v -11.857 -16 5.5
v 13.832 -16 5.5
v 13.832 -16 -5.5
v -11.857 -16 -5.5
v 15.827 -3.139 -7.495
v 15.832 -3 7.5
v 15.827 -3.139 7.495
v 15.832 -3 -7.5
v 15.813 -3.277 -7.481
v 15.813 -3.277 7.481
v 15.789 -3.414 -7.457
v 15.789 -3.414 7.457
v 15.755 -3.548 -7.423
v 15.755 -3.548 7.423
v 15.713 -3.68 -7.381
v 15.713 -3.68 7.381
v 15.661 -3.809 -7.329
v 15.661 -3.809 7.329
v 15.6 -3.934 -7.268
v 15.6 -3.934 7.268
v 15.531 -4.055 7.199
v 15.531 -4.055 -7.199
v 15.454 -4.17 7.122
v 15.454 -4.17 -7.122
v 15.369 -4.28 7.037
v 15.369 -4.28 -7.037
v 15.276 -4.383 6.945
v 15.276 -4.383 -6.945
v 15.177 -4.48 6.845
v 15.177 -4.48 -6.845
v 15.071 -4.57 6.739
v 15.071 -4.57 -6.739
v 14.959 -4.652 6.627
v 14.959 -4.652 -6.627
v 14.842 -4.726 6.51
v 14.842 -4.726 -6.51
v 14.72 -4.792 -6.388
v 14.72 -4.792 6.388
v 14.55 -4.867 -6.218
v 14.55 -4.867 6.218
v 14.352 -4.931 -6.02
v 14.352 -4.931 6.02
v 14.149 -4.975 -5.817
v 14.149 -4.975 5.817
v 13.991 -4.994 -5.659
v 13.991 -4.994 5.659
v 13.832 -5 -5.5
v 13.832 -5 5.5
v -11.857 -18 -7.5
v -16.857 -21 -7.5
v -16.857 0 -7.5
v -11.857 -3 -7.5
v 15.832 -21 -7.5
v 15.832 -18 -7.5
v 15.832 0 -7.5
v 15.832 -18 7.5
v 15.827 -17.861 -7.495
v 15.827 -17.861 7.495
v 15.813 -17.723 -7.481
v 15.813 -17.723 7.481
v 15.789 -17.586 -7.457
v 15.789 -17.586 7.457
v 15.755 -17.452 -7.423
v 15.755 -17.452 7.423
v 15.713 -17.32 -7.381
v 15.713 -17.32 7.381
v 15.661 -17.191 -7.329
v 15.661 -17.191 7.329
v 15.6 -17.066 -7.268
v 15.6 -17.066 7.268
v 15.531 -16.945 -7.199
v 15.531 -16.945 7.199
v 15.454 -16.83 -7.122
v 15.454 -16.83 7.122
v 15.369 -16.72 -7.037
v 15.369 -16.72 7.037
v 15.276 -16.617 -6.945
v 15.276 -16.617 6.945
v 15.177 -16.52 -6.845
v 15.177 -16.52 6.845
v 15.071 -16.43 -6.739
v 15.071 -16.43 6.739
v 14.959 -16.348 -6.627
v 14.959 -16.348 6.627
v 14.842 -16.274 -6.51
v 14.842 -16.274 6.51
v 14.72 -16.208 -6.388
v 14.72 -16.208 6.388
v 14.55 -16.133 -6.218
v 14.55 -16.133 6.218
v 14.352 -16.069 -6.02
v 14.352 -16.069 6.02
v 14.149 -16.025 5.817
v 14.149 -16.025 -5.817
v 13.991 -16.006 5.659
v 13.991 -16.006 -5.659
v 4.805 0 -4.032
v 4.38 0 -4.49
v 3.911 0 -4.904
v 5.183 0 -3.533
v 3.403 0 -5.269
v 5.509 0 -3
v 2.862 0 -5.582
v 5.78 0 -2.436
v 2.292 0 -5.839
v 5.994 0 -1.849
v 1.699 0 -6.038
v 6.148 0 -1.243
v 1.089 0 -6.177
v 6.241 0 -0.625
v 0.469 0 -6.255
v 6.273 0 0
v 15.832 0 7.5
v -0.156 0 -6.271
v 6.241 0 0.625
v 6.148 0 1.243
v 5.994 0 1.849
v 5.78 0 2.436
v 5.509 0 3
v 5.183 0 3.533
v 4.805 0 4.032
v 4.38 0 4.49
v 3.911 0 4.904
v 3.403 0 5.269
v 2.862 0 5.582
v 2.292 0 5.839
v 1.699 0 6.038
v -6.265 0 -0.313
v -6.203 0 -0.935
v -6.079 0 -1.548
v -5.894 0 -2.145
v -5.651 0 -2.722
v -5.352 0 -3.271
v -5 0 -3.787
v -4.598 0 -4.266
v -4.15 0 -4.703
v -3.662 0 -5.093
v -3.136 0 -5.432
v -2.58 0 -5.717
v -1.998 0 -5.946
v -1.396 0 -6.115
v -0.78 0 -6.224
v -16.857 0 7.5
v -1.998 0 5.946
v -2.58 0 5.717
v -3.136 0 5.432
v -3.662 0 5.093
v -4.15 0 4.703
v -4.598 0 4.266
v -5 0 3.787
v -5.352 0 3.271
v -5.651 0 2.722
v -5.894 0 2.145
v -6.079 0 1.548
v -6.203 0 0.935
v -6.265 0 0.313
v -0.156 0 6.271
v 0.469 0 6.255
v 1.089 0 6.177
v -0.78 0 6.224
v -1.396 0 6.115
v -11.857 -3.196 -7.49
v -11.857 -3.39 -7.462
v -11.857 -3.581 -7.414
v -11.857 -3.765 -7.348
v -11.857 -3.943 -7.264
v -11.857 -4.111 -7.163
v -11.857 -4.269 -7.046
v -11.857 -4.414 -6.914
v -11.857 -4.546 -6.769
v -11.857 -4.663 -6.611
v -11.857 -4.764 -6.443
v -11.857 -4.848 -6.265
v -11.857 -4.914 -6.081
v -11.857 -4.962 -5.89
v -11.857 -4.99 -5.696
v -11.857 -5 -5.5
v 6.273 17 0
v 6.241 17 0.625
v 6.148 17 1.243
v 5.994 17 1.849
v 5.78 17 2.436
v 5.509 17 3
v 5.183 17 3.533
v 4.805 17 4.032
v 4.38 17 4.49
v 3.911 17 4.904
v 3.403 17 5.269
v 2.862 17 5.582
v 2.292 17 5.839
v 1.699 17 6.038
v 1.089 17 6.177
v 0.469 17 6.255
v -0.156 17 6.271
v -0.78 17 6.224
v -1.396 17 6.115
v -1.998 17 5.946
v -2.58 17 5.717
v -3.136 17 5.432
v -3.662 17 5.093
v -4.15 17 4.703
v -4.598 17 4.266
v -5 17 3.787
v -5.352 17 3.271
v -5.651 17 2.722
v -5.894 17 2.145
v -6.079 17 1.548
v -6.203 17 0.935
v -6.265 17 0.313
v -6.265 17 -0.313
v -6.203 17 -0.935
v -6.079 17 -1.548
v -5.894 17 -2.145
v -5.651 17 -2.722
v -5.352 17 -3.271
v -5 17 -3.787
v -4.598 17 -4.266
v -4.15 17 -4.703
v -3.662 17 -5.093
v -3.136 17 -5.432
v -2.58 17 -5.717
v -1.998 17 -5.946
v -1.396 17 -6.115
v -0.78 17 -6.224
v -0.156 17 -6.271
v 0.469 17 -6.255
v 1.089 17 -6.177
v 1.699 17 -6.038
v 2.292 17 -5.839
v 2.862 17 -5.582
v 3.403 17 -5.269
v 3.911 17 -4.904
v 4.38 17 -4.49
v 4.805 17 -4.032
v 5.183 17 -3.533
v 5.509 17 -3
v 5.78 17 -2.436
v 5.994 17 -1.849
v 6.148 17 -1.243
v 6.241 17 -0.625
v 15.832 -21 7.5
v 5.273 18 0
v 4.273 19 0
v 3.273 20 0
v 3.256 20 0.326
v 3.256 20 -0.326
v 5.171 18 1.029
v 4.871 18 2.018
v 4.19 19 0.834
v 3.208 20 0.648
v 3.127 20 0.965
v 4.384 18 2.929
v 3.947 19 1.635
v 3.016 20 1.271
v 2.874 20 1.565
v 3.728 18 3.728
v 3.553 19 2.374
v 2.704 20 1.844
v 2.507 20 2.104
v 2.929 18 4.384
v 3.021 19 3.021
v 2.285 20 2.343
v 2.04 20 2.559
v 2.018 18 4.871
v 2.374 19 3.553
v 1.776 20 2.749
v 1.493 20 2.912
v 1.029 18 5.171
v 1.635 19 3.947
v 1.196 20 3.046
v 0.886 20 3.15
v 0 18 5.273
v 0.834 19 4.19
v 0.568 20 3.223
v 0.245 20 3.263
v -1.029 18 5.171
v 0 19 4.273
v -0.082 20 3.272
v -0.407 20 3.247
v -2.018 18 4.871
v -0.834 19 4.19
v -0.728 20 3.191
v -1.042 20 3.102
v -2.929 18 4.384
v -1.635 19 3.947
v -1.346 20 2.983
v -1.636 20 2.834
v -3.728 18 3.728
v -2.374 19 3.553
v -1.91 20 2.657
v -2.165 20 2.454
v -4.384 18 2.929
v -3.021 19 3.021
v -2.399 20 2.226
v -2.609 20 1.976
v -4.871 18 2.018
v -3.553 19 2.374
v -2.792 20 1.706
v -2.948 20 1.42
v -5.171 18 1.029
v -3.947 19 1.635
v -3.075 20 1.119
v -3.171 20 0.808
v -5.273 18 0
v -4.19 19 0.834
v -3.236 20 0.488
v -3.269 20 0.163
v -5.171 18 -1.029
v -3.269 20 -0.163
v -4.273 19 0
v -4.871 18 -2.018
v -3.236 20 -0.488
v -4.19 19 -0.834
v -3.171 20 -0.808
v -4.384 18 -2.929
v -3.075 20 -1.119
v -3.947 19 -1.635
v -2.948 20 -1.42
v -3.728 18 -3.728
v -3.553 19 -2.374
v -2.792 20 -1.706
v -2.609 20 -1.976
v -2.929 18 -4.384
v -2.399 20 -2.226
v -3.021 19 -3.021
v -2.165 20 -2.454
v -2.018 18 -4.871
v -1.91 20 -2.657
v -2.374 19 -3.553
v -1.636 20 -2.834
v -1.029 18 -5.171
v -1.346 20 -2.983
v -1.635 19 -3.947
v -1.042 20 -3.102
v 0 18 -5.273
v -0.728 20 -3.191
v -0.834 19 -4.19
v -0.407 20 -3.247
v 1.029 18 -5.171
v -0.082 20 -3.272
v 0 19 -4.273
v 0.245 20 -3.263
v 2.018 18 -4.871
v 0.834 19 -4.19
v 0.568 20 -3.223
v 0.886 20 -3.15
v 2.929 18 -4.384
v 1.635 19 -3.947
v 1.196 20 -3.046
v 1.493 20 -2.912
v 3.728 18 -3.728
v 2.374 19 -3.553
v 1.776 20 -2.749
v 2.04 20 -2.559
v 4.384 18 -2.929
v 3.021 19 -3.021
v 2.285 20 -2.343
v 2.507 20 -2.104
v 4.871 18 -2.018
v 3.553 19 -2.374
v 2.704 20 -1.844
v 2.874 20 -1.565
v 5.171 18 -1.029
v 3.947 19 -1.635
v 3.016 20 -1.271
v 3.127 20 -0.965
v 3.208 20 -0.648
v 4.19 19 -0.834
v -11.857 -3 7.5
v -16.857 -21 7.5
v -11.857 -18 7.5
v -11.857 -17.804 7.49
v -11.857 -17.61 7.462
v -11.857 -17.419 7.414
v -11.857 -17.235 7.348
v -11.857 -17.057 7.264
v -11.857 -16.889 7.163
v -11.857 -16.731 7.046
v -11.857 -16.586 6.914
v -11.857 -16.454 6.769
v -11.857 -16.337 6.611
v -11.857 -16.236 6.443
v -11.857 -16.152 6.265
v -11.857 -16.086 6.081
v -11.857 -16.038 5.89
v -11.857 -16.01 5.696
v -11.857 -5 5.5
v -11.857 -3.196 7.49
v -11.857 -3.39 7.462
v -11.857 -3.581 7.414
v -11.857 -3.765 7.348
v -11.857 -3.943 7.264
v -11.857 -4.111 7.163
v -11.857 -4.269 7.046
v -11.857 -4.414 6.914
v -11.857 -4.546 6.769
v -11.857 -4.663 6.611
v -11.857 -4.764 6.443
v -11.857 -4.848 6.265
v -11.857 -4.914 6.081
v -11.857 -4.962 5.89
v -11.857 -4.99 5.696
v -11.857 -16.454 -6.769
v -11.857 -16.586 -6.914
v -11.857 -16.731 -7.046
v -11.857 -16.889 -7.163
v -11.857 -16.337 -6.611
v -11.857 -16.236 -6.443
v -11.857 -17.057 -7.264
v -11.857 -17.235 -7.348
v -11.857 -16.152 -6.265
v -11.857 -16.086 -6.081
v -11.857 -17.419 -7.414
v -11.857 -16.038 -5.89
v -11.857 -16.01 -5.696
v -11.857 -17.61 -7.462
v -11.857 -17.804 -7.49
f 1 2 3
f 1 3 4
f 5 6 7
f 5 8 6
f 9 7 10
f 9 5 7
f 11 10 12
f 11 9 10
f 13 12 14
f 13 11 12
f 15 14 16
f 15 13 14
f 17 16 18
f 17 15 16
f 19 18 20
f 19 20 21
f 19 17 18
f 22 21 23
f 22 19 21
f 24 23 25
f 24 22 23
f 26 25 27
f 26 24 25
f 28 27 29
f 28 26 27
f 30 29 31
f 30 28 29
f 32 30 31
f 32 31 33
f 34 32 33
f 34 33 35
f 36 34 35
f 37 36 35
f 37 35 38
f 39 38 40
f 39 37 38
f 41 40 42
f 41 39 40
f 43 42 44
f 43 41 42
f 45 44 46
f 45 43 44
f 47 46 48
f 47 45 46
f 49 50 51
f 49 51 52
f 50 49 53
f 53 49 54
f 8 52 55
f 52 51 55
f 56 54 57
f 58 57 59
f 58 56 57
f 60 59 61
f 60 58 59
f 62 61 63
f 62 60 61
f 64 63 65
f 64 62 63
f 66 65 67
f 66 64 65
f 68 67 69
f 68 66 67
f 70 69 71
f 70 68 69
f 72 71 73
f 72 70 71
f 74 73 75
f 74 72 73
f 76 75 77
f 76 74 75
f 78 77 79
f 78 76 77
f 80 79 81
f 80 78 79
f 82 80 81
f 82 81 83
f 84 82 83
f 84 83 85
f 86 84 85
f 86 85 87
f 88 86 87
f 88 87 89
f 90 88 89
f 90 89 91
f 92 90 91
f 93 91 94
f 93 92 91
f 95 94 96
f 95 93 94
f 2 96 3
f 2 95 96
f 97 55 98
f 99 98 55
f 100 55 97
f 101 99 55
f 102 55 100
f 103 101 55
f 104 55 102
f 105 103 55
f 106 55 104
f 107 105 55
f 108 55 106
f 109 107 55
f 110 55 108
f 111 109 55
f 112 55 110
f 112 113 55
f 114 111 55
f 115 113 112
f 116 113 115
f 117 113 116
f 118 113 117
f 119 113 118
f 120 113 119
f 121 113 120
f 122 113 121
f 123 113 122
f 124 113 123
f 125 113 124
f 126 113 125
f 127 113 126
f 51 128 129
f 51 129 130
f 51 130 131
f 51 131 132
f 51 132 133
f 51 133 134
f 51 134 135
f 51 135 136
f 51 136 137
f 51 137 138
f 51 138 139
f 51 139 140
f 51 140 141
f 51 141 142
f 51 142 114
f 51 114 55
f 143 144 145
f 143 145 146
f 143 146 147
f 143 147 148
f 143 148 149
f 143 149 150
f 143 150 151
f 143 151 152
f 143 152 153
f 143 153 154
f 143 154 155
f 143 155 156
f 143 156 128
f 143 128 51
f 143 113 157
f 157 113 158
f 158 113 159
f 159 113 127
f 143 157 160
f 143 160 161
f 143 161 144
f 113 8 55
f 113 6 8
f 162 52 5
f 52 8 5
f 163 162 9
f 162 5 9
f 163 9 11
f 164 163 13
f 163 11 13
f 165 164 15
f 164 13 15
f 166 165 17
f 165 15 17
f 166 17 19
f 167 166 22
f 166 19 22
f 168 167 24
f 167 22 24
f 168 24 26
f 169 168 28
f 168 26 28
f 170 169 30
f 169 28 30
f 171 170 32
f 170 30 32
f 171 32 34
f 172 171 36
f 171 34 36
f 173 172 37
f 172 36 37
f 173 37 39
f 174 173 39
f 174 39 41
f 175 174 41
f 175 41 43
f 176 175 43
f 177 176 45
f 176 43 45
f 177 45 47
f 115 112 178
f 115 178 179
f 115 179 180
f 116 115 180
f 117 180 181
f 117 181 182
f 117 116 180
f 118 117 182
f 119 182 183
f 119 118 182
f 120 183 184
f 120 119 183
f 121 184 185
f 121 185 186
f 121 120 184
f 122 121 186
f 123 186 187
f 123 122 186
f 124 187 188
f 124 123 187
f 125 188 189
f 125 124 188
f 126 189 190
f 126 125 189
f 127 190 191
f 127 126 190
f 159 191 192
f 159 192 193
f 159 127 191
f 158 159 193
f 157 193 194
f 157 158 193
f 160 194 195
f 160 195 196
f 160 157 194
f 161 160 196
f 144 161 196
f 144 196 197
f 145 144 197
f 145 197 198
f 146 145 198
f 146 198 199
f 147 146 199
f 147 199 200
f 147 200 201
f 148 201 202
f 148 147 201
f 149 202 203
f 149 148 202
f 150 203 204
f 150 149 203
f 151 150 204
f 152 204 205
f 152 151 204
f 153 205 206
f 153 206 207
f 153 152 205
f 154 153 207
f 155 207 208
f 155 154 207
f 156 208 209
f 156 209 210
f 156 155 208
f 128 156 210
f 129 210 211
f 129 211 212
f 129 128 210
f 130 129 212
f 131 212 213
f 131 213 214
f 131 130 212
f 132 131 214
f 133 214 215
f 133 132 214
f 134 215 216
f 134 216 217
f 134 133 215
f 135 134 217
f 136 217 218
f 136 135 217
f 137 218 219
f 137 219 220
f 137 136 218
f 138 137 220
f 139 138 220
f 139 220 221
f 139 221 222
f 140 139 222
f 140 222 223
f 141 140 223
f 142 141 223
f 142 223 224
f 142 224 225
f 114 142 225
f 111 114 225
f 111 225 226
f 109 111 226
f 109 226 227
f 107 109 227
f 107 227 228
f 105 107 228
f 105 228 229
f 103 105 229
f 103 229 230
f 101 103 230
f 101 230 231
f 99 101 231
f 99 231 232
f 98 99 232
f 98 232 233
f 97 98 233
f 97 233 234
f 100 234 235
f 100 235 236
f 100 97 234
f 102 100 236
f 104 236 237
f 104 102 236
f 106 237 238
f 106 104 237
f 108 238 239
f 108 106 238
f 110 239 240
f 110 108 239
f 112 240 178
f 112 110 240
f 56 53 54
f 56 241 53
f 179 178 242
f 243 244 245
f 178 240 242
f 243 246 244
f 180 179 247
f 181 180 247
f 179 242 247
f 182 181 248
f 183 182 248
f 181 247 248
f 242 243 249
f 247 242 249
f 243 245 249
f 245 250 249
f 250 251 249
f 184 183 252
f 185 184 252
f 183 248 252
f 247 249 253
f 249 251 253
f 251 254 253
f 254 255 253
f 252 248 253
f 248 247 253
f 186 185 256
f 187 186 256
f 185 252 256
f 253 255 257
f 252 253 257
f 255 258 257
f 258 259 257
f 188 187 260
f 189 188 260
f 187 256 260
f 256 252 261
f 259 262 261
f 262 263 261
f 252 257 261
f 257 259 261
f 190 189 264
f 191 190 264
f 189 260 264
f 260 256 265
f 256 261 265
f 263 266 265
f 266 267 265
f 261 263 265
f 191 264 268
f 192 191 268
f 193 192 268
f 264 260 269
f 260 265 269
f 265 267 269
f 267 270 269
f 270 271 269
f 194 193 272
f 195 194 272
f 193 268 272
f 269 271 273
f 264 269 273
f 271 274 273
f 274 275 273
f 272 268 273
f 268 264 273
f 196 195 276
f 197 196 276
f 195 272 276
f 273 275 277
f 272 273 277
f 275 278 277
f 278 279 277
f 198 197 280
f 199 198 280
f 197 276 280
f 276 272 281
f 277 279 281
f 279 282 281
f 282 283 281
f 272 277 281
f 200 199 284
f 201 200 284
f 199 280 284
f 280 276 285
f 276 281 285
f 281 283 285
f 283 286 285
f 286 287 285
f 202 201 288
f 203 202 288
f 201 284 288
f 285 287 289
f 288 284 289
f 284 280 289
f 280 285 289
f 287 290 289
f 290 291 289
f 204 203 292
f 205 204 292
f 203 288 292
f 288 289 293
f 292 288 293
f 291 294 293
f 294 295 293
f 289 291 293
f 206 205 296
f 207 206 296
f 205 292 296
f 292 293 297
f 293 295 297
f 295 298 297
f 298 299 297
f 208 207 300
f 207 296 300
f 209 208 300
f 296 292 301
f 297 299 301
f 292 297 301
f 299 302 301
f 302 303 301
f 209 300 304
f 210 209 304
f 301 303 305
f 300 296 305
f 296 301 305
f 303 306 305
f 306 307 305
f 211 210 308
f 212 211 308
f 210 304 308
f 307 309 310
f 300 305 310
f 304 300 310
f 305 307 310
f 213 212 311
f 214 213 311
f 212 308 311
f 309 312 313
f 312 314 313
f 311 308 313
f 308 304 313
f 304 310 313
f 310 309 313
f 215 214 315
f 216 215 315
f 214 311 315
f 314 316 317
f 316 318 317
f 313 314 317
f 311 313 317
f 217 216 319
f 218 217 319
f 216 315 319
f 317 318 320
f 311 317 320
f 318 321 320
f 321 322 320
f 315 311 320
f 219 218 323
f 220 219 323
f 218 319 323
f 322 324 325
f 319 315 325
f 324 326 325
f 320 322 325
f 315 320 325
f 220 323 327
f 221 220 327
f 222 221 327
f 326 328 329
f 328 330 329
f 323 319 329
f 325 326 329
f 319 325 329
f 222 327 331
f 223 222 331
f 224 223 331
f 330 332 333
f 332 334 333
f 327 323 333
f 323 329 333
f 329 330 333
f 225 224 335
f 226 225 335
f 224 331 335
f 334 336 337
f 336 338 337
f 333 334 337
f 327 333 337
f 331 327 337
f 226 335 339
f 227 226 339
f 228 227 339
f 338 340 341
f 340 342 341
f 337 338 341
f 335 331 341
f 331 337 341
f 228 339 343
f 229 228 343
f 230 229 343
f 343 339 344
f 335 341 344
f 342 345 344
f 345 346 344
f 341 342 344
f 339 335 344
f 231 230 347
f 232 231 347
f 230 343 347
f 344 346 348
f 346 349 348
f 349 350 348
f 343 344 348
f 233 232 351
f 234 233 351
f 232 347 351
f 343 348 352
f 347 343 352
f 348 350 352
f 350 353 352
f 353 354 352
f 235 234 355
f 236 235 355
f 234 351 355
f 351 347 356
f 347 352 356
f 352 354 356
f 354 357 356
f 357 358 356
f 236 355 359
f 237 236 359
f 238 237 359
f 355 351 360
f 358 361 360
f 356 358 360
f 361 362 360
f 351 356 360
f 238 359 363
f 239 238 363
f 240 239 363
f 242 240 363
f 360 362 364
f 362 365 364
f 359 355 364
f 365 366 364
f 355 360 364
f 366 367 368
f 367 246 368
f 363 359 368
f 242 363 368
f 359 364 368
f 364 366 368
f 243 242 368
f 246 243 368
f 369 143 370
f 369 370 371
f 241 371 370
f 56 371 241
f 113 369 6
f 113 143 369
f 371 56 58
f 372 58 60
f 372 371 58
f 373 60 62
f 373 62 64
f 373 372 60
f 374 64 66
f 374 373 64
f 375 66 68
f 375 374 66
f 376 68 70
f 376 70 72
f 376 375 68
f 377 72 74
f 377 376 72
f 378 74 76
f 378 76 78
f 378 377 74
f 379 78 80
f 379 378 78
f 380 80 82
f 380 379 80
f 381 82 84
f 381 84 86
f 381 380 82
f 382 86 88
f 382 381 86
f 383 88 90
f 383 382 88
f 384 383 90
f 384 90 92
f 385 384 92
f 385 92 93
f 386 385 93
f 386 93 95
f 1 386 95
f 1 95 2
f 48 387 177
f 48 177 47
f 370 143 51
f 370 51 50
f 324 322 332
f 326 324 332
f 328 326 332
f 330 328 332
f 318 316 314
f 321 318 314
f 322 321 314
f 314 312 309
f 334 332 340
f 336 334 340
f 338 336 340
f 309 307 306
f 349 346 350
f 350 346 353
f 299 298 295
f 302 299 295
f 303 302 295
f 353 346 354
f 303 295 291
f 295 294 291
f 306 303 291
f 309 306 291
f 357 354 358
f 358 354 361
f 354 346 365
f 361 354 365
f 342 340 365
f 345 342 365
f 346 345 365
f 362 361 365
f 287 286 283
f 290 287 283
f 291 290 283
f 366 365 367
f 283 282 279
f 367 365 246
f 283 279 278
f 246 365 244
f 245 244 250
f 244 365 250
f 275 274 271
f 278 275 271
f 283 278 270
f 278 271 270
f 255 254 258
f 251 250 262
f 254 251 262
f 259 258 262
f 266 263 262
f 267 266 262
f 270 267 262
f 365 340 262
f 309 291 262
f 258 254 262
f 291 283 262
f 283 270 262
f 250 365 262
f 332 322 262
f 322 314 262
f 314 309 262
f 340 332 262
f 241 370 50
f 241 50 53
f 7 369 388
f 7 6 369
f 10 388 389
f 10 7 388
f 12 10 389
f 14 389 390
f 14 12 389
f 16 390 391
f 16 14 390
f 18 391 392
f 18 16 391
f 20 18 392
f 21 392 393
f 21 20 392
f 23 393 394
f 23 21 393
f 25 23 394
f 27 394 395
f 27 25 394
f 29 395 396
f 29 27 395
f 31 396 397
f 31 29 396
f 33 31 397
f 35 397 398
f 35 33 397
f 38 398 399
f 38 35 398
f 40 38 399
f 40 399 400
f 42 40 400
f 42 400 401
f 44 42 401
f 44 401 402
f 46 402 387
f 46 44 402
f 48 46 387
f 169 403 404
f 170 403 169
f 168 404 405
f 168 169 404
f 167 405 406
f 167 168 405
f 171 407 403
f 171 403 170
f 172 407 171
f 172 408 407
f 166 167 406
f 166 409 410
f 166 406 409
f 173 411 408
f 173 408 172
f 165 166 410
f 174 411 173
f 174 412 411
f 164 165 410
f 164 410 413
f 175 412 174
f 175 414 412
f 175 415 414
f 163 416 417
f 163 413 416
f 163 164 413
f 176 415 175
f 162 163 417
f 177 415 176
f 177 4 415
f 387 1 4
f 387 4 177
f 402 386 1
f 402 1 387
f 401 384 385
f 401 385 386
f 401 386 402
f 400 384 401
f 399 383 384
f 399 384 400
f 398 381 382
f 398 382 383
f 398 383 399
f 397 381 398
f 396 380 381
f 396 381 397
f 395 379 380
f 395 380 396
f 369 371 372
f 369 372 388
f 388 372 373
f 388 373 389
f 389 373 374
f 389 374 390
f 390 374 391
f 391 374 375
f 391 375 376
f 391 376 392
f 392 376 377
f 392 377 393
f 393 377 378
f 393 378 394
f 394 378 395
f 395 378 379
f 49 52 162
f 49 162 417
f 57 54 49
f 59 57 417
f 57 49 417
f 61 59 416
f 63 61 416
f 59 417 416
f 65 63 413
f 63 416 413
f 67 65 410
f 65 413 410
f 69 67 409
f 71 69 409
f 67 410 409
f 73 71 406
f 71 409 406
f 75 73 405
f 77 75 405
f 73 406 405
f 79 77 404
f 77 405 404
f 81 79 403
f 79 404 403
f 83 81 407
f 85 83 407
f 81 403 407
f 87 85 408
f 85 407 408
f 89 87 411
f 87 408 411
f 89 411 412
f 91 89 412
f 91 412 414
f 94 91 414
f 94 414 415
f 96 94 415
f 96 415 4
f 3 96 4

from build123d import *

# Parameters (mm, degrees)
F1_DEPTH = 7.5
F2_R     = 6.272579
F3_DEPTH = 20
F4_SIZE  = 3
F5_R     = 2


with BuildPart() as f1:
    # F0 (on Top) → F1 (new body, symmetric)
    with BuildSketch(Plane.XY):
        Polygon((15.831904, -5), (15.831904, 0), (-16.857163, 0), (-16.857163, -21), (15.831904, -21), (15.831904, -16), (-11.857163, -16), (-11.857163, -5), align=None)
    extrude(amount=F1_DEPTH, both=True)

    # F2 (on Front) → F3 (join)
    with BuildSketch(Plane.XZ):
        Circle(F2_R)
    extrude(amount=-F3_DEPTH)

    # F4
    f4_edges = [f1.edges().sort_by_distance(p)[0] for p in [
        (-6.272579, 20, 0),
    ]]
    chamfer(f4_edges, length=F4_SIZE)

    # F5
    f5_edges = [f1.edges().sort_by_distance(p)[0] for p in [
        (1.98737, -5, -7.5),
        (1.98737, -16, -7.5),
        (15.831904, -16, 0),
        (15.831904, -5, 0),
        (1.98737, -5, 7.5),
        (1.98737, -16, 7.5),
    ]]
    fillet(f5_edges, radius=F5_R)


solid = f1.part
